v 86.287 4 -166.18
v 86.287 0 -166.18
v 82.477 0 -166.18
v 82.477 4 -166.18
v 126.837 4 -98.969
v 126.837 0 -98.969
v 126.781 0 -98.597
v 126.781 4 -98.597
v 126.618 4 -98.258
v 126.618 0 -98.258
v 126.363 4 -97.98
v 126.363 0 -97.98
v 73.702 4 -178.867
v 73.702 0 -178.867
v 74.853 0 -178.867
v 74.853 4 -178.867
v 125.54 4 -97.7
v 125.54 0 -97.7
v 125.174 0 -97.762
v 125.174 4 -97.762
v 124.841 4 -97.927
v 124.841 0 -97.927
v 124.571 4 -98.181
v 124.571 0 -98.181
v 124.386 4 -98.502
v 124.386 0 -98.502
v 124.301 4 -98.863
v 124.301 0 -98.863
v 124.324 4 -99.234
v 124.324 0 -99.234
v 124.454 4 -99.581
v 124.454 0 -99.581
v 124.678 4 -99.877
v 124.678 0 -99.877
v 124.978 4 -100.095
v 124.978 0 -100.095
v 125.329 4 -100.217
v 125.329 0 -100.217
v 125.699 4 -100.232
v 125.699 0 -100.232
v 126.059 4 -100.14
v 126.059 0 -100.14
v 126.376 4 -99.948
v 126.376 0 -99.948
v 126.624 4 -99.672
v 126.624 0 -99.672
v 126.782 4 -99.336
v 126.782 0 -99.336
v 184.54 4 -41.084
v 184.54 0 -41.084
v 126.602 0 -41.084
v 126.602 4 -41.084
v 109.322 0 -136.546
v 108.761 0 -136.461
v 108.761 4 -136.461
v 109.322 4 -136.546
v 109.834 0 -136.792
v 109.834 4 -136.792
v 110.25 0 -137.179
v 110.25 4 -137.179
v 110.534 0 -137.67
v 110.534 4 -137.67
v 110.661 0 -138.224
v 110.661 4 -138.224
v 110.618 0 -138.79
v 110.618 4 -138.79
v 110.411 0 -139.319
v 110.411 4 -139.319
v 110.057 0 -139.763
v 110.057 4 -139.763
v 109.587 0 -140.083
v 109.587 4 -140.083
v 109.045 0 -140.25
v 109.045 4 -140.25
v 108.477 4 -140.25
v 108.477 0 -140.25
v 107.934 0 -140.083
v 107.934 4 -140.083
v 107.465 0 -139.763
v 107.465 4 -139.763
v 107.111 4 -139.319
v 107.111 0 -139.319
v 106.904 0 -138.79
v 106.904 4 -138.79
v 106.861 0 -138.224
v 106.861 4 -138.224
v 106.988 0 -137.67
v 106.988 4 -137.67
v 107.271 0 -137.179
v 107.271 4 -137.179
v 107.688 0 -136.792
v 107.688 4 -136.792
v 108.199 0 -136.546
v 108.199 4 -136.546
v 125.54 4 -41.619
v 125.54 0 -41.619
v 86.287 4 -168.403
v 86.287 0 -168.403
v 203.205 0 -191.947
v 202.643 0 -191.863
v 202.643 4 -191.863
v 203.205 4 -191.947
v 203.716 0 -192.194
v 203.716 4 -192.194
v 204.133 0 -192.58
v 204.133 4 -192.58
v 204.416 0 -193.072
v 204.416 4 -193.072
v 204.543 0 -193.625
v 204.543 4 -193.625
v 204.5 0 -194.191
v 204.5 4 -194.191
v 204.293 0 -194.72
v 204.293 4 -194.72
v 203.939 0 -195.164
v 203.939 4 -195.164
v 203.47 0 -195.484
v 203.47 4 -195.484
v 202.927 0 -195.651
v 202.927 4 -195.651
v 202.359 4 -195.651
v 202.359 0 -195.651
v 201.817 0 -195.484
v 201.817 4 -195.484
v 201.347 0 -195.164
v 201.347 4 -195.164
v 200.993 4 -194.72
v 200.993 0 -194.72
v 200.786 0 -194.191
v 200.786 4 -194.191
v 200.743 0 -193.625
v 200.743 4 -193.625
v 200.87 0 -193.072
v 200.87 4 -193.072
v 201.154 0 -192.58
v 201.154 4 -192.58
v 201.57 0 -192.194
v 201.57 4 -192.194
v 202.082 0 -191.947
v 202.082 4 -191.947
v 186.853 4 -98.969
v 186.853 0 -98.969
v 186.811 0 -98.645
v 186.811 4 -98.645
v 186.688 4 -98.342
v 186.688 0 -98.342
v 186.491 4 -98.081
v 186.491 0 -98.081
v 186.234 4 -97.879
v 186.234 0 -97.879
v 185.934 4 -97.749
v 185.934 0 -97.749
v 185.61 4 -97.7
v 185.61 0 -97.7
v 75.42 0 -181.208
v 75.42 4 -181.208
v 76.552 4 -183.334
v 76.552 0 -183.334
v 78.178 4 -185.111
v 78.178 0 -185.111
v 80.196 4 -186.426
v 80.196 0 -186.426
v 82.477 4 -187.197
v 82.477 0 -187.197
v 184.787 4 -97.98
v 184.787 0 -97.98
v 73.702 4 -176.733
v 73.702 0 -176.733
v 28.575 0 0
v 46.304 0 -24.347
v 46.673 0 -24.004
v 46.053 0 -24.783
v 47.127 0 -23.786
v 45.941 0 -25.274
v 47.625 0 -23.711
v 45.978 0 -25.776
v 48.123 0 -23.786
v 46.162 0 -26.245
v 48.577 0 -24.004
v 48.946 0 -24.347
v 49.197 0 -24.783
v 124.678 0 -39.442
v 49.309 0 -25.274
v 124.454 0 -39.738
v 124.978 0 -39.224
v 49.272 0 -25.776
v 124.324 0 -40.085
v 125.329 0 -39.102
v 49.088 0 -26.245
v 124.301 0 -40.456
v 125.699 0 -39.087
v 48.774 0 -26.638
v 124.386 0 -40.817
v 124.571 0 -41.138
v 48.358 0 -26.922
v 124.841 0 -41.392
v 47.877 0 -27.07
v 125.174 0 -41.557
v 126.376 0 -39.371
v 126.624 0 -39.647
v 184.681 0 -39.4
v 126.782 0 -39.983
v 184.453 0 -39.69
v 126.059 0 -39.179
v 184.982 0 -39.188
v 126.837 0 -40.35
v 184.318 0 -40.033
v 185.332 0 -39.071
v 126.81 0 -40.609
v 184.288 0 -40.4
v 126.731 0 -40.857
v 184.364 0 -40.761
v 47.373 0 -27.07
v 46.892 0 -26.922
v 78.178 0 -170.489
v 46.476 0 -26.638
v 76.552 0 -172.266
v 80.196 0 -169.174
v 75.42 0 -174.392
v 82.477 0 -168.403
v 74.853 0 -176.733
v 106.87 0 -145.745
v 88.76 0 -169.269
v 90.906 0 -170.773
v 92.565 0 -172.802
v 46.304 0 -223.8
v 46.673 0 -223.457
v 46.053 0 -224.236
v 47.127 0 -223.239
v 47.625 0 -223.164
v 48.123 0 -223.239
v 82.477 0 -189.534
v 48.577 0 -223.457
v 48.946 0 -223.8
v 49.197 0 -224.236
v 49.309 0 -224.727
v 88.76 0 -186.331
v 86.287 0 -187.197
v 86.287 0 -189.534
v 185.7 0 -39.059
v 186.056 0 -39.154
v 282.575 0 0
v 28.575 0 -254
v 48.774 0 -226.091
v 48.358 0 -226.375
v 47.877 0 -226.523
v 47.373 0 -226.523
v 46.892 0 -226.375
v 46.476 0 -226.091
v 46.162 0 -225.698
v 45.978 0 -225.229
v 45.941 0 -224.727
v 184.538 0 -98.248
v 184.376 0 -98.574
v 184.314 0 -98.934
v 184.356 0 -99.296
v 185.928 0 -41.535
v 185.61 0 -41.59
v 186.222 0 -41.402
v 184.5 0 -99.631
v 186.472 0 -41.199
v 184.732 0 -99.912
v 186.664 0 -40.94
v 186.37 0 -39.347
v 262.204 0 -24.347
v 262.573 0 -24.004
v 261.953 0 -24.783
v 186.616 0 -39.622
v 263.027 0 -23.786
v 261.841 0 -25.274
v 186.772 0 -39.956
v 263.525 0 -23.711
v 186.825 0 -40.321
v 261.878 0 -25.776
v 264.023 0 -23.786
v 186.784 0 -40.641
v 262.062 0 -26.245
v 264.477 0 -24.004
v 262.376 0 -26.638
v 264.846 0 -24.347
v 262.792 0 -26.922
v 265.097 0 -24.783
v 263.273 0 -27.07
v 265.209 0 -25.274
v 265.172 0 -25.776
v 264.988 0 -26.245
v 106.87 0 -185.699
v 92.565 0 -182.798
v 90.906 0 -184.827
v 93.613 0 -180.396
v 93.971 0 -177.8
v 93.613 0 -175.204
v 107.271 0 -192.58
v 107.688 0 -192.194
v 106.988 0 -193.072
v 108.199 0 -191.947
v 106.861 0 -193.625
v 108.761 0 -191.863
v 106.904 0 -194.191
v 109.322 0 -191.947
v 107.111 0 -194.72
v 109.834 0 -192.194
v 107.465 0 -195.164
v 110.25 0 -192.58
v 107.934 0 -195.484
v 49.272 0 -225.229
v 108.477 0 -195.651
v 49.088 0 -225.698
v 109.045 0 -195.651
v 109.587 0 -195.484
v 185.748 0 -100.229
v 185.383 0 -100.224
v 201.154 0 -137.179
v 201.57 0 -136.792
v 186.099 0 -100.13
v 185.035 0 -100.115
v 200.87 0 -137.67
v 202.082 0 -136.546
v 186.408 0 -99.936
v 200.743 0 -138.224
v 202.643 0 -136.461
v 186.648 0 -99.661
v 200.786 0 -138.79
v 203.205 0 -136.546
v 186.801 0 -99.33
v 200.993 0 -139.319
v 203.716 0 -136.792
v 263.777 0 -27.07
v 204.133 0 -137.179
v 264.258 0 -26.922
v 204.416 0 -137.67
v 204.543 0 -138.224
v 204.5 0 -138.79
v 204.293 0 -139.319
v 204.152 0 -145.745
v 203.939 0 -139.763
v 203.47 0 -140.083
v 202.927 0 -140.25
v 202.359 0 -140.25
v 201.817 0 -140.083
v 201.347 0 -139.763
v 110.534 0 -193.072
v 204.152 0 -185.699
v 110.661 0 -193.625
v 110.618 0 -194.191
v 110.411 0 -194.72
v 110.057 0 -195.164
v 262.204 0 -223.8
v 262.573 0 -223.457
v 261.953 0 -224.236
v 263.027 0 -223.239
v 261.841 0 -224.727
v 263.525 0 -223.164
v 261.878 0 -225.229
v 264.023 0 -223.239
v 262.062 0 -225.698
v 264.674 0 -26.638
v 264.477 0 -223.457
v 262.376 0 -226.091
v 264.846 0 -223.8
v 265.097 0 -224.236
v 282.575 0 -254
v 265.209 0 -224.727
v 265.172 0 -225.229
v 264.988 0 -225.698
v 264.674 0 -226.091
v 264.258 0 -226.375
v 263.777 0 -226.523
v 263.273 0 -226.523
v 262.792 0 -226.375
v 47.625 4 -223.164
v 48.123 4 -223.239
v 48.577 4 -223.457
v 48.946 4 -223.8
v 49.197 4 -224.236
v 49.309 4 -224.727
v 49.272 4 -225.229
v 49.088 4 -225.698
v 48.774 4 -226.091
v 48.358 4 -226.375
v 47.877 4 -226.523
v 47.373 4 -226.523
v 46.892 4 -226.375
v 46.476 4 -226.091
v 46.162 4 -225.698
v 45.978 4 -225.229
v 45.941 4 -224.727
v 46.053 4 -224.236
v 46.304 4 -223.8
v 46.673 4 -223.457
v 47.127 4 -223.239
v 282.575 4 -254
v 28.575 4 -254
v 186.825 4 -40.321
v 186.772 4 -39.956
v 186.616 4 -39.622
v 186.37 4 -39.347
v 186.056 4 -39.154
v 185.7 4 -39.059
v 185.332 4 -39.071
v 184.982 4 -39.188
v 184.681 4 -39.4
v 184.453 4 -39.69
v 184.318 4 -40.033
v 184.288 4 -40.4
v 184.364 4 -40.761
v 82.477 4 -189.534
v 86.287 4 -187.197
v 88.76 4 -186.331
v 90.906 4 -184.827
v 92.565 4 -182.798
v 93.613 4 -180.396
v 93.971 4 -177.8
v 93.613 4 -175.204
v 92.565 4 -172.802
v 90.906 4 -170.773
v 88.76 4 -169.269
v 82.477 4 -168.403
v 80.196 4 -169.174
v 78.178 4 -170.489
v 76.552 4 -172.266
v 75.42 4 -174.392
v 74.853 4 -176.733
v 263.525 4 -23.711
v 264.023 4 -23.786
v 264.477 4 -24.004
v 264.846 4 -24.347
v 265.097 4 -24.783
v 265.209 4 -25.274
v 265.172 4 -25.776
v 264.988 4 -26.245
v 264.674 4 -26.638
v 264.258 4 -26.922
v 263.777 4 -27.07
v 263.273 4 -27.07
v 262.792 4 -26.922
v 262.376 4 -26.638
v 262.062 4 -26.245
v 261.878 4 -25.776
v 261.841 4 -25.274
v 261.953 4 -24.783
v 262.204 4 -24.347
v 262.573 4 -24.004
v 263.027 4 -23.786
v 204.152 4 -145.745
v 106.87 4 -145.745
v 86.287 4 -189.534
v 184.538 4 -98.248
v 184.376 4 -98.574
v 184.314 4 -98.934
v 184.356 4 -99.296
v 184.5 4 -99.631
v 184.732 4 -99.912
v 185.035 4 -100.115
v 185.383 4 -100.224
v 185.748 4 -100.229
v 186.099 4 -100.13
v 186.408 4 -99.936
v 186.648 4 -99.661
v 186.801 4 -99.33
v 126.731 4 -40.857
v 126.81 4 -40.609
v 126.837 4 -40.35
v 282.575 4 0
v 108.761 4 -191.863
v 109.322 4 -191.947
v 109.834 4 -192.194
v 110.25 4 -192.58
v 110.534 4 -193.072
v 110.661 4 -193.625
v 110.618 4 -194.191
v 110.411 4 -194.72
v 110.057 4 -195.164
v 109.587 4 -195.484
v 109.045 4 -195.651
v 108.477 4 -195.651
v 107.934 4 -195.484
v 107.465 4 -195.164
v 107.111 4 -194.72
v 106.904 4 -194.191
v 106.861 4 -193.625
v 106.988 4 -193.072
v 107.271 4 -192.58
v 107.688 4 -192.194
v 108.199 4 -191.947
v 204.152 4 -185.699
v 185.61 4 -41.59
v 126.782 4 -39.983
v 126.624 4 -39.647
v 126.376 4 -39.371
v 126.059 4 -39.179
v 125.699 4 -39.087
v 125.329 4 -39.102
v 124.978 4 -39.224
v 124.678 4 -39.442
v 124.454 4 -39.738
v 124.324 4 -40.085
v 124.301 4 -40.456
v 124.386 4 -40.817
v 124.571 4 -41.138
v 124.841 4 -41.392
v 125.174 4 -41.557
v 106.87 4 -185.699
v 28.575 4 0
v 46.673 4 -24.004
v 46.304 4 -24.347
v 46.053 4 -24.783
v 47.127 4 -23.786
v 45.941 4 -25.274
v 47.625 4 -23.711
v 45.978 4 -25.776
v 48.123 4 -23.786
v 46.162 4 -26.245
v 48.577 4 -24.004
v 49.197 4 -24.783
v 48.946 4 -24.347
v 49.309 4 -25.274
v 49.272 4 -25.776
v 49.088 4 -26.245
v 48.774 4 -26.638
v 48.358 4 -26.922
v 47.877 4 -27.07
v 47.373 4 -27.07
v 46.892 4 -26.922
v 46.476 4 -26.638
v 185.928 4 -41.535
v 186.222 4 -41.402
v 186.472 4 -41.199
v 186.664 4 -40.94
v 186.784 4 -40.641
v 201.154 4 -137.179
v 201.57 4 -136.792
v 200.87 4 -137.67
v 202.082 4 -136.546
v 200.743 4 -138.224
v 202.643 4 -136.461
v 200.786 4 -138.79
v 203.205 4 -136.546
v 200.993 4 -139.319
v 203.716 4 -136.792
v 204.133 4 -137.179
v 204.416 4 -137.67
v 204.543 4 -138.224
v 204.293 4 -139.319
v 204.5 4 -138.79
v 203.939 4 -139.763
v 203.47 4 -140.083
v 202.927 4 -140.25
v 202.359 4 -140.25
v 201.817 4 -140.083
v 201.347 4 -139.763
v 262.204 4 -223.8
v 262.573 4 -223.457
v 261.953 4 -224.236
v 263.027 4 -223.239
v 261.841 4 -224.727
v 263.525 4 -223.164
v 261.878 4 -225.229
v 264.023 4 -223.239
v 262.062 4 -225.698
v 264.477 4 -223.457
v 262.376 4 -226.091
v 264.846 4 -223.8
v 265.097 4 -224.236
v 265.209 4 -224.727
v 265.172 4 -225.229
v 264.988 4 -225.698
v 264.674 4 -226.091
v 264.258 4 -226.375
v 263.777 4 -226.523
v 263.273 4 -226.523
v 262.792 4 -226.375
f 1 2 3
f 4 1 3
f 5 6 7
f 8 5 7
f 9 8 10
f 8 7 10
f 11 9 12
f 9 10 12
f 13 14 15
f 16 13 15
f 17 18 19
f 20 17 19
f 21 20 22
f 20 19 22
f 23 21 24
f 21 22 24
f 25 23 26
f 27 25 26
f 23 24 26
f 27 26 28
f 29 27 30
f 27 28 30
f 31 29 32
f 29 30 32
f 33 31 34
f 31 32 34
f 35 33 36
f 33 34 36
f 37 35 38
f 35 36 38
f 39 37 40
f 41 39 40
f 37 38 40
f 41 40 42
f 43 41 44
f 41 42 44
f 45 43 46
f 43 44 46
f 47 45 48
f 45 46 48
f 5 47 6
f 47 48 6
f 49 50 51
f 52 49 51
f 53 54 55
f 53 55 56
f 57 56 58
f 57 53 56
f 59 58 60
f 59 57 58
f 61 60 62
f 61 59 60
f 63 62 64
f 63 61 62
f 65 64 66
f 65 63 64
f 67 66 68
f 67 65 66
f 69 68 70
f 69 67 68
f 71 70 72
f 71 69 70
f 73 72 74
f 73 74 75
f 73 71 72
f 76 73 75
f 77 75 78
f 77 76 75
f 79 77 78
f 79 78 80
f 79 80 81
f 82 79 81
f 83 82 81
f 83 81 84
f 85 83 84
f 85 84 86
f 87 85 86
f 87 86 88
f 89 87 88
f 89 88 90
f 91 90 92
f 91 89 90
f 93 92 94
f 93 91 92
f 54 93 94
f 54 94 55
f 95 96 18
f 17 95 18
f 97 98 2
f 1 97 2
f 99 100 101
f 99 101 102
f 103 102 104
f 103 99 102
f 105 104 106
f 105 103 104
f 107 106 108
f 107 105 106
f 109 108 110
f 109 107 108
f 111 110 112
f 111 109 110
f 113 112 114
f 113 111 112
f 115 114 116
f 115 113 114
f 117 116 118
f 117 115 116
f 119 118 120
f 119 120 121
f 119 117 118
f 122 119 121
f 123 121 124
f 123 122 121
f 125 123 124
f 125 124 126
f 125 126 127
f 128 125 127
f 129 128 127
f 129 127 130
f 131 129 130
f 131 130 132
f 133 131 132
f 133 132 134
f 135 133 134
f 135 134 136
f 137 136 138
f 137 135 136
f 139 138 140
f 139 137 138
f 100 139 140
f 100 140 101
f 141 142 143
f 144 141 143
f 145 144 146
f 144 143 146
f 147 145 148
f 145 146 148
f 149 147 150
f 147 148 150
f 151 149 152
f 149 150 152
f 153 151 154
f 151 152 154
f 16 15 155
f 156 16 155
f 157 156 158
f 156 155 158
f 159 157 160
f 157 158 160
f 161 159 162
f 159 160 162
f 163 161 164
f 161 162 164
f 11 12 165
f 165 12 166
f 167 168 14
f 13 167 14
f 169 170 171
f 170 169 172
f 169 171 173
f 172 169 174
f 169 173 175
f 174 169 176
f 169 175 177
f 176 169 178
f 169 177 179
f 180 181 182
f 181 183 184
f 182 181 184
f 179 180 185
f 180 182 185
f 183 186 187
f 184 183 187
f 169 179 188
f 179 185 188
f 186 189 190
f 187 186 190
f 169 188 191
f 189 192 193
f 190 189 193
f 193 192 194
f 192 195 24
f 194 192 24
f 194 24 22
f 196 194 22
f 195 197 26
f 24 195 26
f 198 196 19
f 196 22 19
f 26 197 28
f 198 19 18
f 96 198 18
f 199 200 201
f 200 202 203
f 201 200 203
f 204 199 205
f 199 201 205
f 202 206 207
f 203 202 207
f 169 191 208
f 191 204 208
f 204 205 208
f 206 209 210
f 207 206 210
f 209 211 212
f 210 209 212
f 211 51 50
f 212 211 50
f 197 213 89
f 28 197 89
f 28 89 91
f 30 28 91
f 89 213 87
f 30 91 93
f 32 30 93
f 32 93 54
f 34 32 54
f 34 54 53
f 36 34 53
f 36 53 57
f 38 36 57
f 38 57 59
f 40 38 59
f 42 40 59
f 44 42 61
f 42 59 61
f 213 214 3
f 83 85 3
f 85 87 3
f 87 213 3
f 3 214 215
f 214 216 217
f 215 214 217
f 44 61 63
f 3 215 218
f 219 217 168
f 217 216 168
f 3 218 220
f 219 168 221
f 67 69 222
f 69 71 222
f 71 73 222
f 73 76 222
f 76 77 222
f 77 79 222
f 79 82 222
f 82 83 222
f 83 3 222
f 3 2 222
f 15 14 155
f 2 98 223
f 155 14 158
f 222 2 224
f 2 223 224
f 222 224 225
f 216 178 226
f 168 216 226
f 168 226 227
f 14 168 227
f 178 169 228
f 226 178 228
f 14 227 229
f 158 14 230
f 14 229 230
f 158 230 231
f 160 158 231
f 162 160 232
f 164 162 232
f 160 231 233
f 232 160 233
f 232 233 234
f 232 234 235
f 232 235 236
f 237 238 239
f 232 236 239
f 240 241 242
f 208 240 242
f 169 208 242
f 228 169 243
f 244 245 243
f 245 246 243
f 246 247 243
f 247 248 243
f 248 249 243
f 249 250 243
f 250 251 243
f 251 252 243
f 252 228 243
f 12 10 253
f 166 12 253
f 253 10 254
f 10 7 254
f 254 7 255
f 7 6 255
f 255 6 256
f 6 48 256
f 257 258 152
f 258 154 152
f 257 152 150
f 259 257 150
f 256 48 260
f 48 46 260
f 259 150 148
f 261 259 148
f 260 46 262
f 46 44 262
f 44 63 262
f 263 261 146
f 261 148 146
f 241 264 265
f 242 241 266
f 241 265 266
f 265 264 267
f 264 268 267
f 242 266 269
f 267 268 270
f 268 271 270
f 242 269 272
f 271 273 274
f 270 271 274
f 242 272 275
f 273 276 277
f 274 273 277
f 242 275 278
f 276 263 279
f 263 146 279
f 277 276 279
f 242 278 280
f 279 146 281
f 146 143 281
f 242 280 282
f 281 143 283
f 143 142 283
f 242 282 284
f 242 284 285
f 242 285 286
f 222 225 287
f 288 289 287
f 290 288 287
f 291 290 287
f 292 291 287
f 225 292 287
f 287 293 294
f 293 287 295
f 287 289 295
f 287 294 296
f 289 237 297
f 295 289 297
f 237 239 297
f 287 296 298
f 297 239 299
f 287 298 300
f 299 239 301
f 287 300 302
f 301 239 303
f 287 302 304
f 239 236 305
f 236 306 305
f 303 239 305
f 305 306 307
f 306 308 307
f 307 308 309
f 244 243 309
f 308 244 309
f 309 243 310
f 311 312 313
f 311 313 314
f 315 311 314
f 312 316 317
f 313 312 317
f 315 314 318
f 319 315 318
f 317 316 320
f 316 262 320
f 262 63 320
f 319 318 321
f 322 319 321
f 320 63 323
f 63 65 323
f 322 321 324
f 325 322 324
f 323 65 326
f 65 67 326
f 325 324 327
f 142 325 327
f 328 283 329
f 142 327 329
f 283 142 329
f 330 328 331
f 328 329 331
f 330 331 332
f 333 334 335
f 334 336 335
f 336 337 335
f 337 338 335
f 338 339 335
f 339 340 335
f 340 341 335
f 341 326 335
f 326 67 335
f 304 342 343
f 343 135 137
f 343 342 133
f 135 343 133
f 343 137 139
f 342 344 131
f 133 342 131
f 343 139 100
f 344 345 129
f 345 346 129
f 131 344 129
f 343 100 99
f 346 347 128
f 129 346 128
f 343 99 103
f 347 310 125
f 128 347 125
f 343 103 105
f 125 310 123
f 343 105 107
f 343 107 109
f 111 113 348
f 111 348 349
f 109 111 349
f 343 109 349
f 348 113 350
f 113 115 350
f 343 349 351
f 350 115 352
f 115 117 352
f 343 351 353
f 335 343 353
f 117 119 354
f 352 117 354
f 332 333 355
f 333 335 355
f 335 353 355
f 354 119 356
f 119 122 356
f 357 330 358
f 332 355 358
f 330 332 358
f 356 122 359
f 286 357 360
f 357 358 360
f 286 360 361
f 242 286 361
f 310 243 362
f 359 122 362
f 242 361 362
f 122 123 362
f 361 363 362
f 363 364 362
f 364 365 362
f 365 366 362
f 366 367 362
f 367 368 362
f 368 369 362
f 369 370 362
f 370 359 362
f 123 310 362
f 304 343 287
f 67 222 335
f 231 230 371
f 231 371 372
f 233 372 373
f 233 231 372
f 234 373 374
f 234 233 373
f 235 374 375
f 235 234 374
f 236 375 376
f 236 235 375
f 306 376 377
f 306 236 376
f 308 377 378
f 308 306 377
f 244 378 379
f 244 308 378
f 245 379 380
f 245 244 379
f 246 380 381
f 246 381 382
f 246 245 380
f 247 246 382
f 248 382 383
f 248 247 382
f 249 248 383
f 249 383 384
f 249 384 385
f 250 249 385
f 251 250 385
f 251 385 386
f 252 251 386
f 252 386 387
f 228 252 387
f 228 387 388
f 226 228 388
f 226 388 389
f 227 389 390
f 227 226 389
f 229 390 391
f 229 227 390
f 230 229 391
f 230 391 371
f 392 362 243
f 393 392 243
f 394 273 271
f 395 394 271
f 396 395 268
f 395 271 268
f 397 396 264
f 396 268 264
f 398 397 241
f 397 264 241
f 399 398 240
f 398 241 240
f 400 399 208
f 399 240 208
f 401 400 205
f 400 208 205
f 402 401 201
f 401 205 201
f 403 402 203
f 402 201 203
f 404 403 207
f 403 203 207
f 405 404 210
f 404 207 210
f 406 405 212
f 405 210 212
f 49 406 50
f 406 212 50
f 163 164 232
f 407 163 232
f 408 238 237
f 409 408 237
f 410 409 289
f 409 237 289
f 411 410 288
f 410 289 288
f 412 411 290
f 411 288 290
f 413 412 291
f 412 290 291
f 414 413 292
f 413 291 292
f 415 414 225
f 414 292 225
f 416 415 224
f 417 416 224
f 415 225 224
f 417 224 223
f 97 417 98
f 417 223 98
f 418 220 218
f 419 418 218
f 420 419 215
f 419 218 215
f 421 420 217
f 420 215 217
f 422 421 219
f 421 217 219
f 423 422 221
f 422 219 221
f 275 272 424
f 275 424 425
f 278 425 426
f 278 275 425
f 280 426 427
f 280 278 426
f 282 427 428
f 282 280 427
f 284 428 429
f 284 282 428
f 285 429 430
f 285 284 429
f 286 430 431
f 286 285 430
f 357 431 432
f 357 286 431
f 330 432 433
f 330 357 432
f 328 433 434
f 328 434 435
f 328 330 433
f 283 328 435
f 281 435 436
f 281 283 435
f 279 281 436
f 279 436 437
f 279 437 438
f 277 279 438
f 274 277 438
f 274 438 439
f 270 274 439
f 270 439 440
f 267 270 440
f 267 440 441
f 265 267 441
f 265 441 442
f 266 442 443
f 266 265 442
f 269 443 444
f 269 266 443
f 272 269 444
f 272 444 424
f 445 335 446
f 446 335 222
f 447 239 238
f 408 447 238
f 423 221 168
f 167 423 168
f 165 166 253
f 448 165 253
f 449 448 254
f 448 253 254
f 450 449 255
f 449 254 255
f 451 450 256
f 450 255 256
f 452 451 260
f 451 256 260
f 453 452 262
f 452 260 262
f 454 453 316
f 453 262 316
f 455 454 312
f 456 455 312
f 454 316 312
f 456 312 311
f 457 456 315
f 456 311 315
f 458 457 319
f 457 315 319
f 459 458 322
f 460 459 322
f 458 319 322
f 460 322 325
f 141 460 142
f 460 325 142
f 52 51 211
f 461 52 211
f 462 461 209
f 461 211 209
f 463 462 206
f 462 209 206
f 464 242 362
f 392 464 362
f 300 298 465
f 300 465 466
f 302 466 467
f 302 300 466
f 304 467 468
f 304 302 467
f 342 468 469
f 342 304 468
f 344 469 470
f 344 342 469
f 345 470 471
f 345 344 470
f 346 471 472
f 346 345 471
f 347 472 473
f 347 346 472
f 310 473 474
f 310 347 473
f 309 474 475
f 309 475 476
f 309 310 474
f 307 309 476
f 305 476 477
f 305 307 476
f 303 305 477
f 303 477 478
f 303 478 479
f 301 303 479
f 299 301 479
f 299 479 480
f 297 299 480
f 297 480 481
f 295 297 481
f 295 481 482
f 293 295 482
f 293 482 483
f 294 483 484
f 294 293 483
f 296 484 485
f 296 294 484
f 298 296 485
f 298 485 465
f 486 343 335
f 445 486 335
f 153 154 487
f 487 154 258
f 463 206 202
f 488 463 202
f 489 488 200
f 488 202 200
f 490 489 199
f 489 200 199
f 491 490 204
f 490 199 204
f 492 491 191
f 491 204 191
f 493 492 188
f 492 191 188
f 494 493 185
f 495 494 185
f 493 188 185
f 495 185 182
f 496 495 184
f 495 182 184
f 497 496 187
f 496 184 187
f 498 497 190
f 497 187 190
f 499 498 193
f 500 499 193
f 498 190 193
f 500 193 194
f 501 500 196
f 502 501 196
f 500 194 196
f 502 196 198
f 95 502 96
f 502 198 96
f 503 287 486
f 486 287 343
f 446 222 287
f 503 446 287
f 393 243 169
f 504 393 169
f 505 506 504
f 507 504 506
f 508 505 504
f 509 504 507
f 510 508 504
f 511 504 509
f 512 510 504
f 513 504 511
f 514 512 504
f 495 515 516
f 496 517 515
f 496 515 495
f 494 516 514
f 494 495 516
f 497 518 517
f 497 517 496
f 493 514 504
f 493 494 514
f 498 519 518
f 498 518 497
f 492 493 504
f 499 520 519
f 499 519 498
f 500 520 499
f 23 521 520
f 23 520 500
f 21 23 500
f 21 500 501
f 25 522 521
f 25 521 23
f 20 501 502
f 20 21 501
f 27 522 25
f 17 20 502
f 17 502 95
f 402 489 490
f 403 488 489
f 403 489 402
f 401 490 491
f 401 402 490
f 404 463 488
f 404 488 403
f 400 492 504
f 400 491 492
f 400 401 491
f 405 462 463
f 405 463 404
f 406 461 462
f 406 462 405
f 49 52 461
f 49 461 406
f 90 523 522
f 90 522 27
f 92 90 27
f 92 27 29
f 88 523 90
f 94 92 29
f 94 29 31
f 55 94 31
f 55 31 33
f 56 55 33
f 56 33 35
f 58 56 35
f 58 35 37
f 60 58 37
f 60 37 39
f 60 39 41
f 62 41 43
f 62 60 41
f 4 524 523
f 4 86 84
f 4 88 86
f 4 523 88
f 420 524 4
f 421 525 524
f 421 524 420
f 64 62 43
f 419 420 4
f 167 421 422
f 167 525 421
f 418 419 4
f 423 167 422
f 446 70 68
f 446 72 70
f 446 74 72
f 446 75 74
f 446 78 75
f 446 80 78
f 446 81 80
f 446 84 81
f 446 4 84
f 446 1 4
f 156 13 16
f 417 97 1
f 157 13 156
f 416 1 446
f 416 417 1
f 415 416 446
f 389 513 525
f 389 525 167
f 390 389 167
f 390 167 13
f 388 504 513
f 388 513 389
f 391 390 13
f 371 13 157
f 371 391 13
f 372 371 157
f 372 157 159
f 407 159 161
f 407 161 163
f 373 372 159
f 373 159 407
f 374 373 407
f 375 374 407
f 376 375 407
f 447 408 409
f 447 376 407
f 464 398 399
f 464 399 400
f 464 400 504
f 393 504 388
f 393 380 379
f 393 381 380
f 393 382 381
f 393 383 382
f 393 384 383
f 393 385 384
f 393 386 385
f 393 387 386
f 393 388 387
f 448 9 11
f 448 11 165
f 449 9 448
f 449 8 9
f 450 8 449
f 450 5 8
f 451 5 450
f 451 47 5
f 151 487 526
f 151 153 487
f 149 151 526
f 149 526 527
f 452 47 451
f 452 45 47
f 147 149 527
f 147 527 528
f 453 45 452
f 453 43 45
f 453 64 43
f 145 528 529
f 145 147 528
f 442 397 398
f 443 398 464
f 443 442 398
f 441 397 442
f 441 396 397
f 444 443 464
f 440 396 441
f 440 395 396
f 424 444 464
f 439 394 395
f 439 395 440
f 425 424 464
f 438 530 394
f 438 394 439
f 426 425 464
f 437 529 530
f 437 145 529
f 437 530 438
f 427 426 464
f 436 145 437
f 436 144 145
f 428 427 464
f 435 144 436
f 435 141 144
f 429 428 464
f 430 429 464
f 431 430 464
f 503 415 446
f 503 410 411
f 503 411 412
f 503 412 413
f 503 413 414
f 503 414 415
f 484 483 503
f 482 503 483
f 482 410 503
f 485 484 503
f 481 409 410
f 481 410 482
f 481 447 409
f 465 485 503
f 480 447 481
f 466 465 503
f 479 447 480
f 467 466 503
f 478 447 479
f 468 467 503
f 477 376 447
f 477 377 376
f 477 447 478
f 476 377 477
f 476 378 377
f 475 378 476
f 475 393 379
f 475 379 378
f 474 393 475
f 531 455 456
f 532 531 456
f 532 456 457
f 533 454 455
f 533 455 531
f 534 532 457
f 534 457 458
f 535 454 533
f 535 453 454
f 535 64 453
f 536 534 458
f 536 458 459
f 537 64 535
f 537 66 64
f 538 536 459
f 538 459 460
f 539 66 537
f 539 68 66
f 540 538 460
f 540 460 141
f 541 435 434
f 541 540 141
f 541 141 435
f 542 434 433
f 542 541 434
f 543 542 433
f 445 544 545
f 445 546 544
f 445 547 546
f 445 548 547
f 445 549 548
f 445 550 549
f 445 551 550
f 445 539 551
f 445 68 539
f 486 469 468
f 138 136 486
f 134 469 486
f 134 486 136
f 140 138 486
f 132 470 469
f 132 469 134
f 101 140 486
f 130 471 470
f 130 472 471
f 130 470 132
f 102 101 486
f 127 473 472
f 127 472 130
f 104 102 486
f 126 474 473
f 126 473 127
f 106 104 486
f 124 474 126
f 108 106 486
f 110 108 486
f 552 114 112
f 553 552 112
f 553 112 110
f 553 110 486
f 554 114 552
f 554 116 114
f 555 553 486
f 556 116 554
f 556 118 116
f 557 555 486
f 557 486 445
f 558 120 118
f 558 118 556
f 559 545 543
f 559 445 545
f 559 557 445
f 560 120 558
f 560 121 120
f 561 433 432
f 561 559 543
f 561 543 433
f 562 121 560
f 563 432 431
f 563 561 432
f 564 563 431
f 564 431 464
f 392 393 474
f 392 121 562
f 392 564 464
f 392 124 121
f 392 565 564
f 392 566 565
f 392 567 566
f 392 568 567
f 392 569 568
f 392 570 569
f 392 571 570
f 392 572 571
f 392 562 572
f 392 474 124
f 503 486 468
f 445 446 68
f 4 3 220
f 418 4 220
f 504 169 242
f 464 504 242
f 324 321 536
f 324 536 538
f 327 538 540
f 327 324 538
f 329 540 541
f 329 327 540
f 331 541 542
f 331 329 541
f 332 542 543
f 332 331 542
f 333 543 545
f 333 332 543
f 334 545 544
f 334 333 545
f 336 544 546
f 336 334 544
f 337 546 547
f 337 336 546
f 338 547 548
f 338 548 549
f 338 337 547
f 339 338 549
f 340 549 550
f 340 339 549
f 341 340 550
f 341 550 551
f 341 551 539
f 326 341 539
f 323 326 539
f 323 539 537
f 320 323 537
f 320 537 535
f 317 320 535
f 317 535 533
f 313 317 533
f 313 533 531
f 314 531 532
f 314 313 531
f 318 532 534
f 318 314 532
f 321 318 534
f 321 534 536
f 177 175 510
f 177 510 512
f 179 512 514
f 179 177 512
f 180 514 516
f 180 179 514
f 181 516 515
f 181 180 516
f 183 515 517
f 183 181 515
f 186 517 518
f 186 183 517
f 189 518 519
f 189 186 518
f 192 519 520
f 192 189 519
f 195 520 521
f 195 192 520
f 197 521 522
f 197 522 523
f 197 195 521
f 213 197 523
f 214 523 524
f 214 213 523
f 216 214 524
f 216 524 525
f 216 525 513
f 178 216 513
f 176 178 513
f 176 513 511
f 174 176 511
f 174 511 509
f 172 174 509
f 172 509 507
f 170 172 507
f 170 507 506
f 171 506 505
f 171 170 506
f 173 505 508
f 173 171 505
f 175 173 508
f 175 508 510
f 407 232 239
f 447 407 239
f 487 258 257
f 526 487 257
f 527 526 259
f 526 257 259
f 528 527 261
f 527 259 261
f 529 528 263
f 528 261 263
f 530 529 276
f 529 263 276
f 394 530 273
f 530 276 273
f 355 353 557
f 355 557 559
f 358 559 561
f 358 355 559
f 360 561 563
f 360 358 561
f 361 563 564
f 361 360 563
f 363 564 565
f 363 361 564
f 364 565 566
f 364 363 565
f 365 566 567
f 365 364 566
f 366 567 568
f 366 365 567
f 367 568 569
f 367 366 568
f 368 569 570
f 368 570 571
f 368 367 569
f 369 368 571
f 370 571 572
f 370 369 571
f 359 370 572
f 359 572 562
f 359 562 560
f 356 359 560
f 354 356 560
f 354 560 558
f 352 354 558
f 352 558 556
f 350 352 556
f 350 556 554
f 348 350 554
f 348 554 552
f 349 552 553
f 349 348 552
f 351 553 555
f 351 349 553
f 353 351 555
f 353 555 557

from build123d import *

# Parameters (mm, degrees)
SKETCH1_R           = 1.6891
SKETCH1_R_2         = 1.905
BOSS_EXTRUDE1_DEPTH = 4


with BuildPart() as part:
    # Sketch1 → Boss-Extrude1 (new body)
    with BuildSketch(Plane(origin=(0, 0, 0), x_dir=(1, 0, 0), z_dir=(0, 1, 0))):
        Polygon((28.575, 215.9), (28.575, 0), (282.575, 0), (282.575, 254), (28.575, 254), align=None)
        with Locations(Location((47.625, 25.4, 0), (0, 0, 270))):
            Circle(SKETCH1_R, mode=Mode.SUBTRACT)
        with BuildLine():
            Line((184.540258822, 41.0845), (155.163048801, 41.0845))
            Line((155.163048801, 41.0845), (126.602331606, 41.0845))
            ThreePointArc((126.602331606, 41.0845), (126.776599265, 40.735252505), (126.836576836, 40.349576836))
            ThreePointArc((126.836576836, 40.349576836), (124.678175908, 39.442028606), (125.5395, 41.61928816))
            Line((125.5395, 41.61928816), (125.5395, 97.69971184))
            ThreePointArc((125.5395, 97.69971184), (124.678175908, 99.876971394), (126.836576836, 98.969423164))
            ThreePointArc((126.836576836, 98.969423164), (126.712192056, 98.421275585), (126.363402398, 97.9805))
            Line((126.363402398, 97.9805), (184.786597602, 97.9805))
            ThreePointArc((184.786597602, 97.9805), (185.035275585, 100.115038384), (186.853423164, 98.969423164))
            ThreePointArc((186.853423164, 98.969423164), (186.490971394, 98.081022236), (185.6105, 97.69971184))
            Line((185.6105, 97.69971184), (185.6105, 41.589727831))
            ThreePointArc((185.6105, 41.589727831), (186.472493583, 41.199152325), (186.825084987, 40.320937393))
            ThreePointArc((186.825084987, 40.320937393), (185.152548795, 39.116418977), (184.540258822, 41.0845))
        make_face(mode=Mode.SUBTRACT)
        with Locations(Location((263.525, 25.4, 0), (0, 0, 270))):
            Circle(SKETCH1_R, mode=Mode.SUBTRACT)
        with BuildLine():
            Line((82.477295998, 189.534156397), (84.382295998, 189.534156397))
            Line((84.382295998, 189.534156397), (86.287295998, 189.534156397))
            Line((86.287295998, 189.534156397), (86.287295998, 187.197356397))
            ThreePointArc((86.287295998, 187.197356397), (93.970795998, 177.8), (86.287295998, 168.402643603))
            Line((86.287295998, 168.402643603), (86.287295998, 166.1795))
            Line((86.287295998, 166.1795), (84.382295998, 166.1795))
            Line((84.382295998, 166.1795), (82.477295998, 166.1795))
            Line((82.477295998, 166.1795), (82.477295998, 168.402643603))
            ThreePointArc((82.477295998, 168.402643603), (77.30886259, 171.326525503), (74.853325959, 176.7332))
            Line((74.853325959, 176.7332), (73.701595998, 176.7332))
            Line((73.701595998, 176.7332), (73.701595998, 177.8))
            Line((73.701595998, 177.8), (73.701595998, 178.8668))
            Line((73.701595998, 178.8668), (74.853325959, 178.8668))
            ThreePointArc((74.853325959, 178.8668), (77.30886259, 184.273474497), (82.477295998, 187.197356397))
            Line((82.477295998, 187.197356397), (82.477295998, 189.534156397))
        make_face(mode=Mode.SUBTRACT)
        with Locations(Location((108.760866591, 138.366268292, 0), (0, 0, 270))):
            Circle(SKETCH1_R_2, mode=Mode.SUBTRACT)
        Polygon((106.8705, 185.6994), (155.575, 185.6994), (204.1525, 185.6994), (204.1525, 145.7452), (106.8705, 145.7452), align=None, mode=Mode.SUBTRACT)
        with Locations(Location((47.625, 224.852960253, 0), (0, 0, 270))):
            Circle(SKETCH1_R, mode=Mode.SUBTRACT)
        with Locations(Location((108.760866591, 193.767535109, 0), (0, 0, 270))):
            Circle(SKETCH1_R_2, mode=Mode.SUBTRACT)
        with Locations(Location((202.643133409, 138.366268292, 0), (0, 0, 270))):
            Circle(SKETCH1_R_2, mode=Mode.SUBTRACT)
        with Locations(Location((202.643133409, 193.767535109, 0), (0, 0, 270))):
            Circle(SKETCH1_R_2, mode=Mode.SUBTRACT)
        with Locations(Location((263.525, 224.852960253, 0), (0, 0, 270))):
            Circle(SKETCH1_R, mode=Mode.SUBTRACT)
    extrude(amount=BOSS_EXTRUDE1_DEPTH)


solid = part.part
